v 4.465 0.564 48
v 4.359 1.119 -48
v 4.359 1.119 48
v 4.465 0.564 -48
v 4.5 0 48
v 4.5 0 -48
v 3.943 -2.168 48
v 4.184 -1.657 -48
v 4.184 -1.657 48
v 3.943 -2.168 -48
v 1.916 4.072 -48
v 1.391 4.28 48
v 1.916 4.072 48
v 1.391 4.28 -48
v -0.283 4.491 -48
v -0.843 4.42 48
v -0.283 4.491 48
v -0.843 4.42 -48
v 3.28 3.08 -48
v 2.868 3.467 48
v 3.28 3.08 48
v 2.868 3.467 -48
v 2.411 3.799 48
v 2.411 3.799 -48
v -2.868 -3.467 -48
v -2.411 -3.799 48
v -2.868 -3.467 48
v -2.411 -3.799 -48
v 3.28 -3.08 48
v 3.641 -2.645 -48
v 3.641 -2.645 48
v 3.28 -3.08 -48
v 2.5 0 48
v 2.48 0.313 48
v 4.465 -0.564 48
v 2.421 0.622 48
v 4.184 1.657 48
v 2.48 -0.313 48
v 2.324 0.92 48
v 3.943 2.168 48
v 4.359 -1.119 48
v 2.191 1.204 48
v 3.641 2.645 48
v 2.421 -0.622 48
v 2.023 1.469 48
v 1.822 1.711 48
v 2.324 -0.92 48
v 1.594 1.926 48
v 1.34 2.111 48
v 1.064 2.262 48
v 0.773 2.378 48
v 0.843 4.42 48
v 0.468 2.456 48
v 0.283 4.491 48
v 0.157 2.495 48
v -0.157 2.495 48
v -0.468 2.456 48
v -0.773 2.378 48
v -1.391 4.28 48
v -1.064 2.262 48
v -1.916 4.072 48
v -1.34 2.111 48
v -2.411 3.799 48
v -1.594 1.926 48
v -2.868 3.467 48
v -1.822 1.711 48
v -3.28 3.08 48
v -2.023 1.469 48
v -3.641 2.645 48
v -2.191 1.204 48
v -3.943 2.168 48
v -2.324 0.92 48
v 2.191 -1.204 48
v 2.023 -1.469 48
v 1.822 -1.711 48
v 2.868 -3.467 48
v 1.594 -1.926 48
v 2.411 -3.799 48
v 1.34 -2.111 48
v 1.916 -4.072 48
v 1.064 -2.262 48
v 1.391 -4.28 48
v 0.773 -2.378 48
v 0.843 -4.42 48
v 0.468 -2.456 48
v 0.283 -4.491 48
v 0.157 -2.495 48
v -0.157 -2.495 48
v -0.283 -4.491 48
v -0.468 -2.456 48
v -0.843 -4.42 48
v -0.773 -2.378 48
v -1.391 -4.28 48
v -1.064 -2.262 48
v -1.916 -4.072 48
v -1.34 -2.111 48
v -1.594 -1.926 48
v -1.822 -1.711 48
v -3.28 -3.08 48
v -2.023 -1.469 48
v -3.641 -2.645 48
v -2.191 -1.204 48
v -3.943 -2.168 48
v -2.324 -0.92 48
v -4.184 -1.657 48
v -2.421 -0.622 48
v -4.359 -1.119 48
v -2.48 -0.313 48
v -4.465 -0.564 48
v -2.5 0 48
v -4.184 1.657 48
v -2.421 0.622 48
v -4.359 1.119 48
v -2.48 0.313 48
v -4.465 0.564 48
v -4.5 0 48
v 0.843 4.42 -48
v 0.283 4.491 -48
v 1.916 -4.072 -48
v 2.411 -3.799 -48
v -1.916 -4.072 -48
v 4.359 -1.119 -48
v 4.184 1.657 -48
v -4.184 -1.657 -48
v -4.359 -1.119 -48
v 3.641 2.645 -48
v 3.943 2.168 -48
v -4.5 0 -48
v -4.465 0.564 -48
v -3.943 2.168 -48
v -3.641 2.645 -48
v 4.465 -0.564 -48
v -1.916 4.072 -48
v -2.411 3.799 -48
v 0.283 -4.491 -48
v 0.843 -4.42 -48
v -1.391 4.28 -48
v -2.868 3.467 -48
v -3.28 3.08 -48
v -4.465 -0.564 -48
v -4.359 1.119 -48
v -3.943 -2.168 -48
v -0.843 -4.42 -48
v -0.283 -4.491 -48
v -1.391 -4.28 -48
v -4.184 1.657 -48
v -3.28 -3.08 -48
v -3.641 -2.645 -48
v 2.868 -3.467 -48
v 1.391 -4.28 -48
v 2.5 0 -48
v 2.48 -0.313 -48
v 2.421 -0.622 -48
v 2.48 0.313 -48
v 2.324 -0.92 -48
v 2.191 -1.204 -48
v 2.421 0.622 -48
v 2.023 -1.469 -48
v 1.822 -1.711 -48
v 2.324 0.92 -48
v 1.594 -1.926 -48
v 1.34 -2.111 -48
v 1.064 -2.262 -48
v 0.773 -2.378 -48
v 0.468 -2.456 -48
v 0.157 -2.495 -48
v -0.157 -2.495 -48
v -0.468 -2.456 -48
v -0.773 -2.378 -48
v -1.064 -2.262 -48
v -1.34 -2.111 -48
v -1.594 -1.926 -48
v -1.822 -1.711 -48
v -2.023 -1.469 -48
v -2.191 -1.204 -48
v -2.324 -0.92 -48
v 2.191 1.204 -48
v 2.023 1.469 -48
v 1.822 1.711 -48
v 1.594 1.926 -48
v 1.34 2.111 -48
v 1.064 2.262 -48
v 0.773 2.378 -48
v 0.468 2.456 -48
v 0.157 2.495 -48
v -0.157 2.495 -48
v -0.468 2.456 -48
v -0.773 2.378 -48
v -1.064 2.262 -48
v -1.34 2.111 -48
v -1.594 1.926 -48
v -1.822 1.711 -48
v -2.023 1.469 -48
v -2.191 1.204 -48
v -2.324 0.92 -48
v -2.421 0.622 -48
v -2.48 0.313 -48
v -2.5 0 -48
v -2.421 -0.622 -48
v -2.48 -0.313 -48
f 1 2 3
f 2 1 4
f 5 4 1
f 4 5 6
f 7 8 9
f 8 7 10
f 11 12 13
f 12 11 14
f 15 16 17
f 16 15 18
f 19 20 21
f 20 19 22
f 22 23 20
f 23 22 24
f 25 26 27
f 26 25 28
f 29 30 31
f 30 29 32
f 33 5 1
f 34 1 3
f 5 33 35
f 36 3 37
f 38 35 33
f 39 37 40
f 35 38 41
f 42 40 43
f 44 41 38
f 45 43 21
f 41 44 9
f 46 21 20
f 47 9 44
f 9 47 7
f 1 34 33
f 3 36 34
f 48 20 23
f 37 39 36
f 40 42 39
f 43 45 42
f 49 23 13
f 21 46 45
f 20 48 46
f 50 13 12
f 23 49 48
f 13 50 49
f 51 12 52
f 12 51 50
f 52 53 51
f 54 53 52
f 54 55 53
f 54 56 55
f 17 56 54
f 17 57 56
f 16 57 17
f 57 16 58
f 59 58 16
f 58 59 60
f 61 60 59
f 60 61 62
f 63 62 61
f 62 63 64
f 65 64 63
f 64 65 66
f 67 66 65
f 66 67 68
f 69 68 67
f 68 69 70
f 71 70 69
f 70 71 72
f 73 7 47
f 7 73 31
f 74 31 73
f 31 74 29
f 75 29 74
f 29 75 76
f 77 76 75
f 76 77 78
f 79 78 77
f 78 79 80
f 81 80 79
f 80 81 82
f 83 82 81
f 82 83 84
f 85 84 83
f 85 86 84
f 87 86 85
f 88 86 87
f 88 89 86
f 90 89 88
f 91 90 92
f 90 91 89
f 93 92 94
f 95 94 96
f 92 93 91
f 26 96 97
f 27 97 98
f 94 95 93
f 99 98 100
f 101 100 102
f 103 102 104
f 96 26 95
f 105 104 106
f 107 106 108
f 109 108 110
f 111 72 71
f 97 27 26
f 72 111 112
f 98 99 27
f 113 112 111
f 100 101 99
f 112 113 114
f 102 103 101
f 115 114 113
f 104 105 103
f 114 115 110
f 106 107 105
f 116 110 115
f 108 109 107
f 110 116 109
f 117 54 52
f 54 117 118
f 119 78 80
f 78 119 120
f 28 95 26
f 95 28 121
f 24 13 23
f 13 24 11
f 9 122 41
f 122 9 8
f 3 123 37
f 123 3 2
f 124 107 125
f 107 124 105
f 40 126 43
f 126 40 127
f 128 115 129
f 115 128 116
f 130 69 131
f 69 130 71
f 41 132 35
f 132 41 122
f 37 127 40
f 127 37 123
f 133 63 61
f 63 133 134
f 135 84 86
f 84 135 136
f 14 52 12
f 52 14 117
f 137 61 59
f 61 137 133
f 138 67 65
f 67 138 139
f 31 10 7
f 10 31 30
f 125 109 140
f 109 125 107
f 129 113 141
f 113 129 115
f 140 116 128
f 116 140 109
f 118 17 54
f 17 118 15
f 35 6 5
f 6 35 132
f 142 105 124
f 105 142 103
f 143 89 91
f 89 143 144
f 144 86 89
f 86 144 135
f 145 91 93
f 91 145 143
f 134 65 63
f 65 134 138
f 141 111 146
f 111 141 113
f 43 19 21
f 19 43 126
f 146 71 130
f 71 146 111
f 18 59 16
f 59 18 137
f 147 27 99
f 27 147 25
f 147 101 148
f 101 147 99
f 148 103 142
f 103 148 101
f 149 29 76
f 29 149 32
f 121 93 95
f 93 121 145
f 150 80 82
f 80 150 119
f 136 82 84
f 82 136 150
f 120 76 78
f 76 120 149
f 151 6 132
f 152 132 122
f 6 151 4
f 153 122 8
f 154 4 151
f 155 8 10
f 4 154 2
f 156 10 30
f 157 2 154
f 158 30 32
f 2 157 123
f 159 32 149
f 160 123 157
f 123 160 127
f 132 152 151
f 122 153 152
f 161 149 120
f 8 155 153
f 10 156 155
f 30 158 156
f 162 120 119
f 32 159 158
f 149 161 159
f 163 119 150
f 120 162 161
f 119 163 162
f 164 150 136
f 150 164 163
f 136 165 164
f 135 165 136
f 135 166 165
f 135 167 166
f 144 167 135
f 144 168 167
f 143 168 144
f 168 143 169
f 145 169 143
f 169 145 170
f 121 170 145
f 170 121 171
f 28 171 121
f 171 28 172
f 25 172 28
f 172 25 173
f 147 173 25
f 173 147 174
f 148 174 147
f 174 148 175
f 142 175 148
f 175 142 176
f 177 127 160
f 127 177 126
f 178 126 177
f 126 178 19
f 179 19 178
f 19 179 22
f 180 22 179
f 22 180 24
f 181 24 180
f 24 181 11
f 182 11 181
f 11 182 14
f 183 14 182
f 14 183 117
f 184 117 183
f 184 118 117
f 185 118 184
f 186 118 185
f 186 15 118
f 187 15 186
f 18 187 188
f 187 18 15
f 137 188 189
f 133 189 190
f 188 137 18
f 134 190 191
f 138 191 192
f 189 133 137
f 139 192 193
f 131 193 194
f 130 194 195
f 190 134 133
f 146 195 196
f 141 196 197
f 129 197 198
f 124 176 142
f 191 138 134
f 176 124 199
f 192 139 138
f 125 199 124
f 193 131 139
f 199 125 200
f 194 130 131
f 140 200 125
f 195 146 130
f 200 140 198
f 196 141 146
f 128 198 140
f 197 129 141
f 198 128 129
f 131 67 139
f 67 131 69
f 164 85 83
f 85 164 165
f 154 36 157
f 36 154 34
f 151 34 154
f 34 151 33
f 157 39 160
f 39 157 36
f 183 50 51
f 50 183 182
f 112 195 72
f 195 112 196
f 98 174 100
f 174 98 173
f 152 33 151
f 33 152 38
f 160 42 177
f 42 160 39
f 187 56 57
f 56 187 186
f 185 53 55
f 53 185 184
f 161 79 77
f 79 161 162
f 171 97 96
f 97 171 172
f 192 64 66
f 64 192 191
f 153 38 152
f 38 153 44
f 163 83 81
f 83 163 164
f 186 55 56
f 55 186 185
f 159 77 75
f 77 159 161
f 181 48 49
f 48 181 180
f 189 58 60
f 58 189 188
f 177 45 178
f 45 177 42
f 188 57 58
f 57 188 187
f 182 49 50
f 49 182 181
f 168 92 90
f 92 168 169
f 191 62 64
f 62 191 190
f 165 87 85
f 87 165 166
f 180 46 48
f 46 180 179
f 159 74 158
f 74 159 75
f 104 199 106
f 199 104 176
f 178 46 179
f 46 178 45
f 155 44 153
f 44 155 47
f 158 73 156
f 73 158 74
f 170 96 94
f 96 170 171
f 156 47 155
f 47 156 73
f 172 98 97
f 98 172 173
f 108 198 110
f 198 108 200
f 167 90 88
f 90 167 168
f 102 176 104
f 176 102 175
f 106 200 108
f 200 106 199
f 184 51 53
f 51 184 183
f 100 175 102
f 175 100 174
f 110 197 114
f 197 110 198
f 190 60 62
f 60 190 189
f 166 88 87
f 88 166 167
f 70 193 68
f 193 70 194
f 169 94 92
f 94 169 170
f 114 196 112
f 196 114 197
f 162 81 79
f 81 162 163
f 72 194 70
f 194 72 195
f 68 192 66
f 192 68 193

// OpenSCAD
$fn = 50;


difference() {
	union() {
		translate(v = [0, 0, -48.0000000000]) {
			cylinder(h = 96, r = 4.5000000000);
		}
	}
	union() {
		translate(v = [0, 0, -100.0000000000]) {
			cylinder(h = 200, r = 2.5000000000);
		}
	}
}
